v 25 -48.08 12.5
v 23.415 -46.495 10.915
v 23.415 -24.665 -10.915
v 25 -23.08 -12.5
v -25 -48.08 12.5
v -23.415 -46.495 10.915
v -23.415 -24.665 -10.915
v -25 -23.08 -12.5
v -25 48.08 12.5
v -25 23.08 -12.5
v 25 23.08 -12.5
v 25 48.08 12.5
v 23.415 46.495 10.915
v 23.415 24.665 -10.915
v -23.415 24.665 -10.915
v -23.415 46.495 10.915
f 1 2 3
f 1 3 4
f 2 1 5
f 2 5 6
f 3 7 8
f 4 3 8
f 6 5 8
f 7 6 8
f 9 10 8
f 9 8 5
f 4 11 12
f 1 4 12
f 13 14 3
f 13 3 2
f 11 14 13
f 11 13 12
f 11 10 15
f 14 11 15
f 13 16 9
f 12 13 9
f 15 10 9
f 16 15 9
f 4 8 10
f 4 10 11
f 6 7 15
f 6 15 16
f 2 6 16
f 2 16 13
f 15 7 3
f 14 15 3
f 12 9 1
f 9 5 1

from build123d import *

# Parameters (mm, degrees)
F0_W        = 50
F0_H        = 25
F0_W_2      = 46.83
F0_H_2      = 21.83
F1_DEPTH    = 48.08
F2_T1_DEPTH = 178.5841493983
F3_T1_DEPTH = 178.5841493983


# Not quite as in the source:
# - a fillet or chamfer that OpenCascade refuses, or shapes differently, is made with other operations: its cross-section is extruded or revolved along the edge and cut away or added


with BuildPart() as f1:
    # F0 (on Front) → F1 (new body, symmetric)
    with BuildSketch(Plane.XZ):
        Rectangle(F0_W, F0_H)
        Rectangle(F0_W_2, F0_H_2, mode=Mode.SUBTRACT)
    extrude(amount=F1_DEPTH, both=True)

    # F2: chamfer of 25 on 1 edges, made by hand

    # F2_s2 → F2_t1 (cut)
    with BuildSketch(Plane.YZ.offset(-89.2920746991)):
        Polygon((-48.08, 12.5), (-23.08, -12.5), (-48.08, -12.5), align=None)
    extrude(amount=F2_T1_DEPTH, mode=Mode.SUBTRACT)

    # F3: chamfer of 25 on 1 edges, made by hand

    # F3_s2 → F3_t1 (cut)
    with BuildSketch(Plane.YZ.offset(-89.2920746991)):
        Polygon((23.08, -12.5), (48.08, 12.5), (48.08, -12.5), align=None)
    extrude(amount=F3_T1_DEPTH, mode=Mode.SUBTRACT)


solid = f1.part
